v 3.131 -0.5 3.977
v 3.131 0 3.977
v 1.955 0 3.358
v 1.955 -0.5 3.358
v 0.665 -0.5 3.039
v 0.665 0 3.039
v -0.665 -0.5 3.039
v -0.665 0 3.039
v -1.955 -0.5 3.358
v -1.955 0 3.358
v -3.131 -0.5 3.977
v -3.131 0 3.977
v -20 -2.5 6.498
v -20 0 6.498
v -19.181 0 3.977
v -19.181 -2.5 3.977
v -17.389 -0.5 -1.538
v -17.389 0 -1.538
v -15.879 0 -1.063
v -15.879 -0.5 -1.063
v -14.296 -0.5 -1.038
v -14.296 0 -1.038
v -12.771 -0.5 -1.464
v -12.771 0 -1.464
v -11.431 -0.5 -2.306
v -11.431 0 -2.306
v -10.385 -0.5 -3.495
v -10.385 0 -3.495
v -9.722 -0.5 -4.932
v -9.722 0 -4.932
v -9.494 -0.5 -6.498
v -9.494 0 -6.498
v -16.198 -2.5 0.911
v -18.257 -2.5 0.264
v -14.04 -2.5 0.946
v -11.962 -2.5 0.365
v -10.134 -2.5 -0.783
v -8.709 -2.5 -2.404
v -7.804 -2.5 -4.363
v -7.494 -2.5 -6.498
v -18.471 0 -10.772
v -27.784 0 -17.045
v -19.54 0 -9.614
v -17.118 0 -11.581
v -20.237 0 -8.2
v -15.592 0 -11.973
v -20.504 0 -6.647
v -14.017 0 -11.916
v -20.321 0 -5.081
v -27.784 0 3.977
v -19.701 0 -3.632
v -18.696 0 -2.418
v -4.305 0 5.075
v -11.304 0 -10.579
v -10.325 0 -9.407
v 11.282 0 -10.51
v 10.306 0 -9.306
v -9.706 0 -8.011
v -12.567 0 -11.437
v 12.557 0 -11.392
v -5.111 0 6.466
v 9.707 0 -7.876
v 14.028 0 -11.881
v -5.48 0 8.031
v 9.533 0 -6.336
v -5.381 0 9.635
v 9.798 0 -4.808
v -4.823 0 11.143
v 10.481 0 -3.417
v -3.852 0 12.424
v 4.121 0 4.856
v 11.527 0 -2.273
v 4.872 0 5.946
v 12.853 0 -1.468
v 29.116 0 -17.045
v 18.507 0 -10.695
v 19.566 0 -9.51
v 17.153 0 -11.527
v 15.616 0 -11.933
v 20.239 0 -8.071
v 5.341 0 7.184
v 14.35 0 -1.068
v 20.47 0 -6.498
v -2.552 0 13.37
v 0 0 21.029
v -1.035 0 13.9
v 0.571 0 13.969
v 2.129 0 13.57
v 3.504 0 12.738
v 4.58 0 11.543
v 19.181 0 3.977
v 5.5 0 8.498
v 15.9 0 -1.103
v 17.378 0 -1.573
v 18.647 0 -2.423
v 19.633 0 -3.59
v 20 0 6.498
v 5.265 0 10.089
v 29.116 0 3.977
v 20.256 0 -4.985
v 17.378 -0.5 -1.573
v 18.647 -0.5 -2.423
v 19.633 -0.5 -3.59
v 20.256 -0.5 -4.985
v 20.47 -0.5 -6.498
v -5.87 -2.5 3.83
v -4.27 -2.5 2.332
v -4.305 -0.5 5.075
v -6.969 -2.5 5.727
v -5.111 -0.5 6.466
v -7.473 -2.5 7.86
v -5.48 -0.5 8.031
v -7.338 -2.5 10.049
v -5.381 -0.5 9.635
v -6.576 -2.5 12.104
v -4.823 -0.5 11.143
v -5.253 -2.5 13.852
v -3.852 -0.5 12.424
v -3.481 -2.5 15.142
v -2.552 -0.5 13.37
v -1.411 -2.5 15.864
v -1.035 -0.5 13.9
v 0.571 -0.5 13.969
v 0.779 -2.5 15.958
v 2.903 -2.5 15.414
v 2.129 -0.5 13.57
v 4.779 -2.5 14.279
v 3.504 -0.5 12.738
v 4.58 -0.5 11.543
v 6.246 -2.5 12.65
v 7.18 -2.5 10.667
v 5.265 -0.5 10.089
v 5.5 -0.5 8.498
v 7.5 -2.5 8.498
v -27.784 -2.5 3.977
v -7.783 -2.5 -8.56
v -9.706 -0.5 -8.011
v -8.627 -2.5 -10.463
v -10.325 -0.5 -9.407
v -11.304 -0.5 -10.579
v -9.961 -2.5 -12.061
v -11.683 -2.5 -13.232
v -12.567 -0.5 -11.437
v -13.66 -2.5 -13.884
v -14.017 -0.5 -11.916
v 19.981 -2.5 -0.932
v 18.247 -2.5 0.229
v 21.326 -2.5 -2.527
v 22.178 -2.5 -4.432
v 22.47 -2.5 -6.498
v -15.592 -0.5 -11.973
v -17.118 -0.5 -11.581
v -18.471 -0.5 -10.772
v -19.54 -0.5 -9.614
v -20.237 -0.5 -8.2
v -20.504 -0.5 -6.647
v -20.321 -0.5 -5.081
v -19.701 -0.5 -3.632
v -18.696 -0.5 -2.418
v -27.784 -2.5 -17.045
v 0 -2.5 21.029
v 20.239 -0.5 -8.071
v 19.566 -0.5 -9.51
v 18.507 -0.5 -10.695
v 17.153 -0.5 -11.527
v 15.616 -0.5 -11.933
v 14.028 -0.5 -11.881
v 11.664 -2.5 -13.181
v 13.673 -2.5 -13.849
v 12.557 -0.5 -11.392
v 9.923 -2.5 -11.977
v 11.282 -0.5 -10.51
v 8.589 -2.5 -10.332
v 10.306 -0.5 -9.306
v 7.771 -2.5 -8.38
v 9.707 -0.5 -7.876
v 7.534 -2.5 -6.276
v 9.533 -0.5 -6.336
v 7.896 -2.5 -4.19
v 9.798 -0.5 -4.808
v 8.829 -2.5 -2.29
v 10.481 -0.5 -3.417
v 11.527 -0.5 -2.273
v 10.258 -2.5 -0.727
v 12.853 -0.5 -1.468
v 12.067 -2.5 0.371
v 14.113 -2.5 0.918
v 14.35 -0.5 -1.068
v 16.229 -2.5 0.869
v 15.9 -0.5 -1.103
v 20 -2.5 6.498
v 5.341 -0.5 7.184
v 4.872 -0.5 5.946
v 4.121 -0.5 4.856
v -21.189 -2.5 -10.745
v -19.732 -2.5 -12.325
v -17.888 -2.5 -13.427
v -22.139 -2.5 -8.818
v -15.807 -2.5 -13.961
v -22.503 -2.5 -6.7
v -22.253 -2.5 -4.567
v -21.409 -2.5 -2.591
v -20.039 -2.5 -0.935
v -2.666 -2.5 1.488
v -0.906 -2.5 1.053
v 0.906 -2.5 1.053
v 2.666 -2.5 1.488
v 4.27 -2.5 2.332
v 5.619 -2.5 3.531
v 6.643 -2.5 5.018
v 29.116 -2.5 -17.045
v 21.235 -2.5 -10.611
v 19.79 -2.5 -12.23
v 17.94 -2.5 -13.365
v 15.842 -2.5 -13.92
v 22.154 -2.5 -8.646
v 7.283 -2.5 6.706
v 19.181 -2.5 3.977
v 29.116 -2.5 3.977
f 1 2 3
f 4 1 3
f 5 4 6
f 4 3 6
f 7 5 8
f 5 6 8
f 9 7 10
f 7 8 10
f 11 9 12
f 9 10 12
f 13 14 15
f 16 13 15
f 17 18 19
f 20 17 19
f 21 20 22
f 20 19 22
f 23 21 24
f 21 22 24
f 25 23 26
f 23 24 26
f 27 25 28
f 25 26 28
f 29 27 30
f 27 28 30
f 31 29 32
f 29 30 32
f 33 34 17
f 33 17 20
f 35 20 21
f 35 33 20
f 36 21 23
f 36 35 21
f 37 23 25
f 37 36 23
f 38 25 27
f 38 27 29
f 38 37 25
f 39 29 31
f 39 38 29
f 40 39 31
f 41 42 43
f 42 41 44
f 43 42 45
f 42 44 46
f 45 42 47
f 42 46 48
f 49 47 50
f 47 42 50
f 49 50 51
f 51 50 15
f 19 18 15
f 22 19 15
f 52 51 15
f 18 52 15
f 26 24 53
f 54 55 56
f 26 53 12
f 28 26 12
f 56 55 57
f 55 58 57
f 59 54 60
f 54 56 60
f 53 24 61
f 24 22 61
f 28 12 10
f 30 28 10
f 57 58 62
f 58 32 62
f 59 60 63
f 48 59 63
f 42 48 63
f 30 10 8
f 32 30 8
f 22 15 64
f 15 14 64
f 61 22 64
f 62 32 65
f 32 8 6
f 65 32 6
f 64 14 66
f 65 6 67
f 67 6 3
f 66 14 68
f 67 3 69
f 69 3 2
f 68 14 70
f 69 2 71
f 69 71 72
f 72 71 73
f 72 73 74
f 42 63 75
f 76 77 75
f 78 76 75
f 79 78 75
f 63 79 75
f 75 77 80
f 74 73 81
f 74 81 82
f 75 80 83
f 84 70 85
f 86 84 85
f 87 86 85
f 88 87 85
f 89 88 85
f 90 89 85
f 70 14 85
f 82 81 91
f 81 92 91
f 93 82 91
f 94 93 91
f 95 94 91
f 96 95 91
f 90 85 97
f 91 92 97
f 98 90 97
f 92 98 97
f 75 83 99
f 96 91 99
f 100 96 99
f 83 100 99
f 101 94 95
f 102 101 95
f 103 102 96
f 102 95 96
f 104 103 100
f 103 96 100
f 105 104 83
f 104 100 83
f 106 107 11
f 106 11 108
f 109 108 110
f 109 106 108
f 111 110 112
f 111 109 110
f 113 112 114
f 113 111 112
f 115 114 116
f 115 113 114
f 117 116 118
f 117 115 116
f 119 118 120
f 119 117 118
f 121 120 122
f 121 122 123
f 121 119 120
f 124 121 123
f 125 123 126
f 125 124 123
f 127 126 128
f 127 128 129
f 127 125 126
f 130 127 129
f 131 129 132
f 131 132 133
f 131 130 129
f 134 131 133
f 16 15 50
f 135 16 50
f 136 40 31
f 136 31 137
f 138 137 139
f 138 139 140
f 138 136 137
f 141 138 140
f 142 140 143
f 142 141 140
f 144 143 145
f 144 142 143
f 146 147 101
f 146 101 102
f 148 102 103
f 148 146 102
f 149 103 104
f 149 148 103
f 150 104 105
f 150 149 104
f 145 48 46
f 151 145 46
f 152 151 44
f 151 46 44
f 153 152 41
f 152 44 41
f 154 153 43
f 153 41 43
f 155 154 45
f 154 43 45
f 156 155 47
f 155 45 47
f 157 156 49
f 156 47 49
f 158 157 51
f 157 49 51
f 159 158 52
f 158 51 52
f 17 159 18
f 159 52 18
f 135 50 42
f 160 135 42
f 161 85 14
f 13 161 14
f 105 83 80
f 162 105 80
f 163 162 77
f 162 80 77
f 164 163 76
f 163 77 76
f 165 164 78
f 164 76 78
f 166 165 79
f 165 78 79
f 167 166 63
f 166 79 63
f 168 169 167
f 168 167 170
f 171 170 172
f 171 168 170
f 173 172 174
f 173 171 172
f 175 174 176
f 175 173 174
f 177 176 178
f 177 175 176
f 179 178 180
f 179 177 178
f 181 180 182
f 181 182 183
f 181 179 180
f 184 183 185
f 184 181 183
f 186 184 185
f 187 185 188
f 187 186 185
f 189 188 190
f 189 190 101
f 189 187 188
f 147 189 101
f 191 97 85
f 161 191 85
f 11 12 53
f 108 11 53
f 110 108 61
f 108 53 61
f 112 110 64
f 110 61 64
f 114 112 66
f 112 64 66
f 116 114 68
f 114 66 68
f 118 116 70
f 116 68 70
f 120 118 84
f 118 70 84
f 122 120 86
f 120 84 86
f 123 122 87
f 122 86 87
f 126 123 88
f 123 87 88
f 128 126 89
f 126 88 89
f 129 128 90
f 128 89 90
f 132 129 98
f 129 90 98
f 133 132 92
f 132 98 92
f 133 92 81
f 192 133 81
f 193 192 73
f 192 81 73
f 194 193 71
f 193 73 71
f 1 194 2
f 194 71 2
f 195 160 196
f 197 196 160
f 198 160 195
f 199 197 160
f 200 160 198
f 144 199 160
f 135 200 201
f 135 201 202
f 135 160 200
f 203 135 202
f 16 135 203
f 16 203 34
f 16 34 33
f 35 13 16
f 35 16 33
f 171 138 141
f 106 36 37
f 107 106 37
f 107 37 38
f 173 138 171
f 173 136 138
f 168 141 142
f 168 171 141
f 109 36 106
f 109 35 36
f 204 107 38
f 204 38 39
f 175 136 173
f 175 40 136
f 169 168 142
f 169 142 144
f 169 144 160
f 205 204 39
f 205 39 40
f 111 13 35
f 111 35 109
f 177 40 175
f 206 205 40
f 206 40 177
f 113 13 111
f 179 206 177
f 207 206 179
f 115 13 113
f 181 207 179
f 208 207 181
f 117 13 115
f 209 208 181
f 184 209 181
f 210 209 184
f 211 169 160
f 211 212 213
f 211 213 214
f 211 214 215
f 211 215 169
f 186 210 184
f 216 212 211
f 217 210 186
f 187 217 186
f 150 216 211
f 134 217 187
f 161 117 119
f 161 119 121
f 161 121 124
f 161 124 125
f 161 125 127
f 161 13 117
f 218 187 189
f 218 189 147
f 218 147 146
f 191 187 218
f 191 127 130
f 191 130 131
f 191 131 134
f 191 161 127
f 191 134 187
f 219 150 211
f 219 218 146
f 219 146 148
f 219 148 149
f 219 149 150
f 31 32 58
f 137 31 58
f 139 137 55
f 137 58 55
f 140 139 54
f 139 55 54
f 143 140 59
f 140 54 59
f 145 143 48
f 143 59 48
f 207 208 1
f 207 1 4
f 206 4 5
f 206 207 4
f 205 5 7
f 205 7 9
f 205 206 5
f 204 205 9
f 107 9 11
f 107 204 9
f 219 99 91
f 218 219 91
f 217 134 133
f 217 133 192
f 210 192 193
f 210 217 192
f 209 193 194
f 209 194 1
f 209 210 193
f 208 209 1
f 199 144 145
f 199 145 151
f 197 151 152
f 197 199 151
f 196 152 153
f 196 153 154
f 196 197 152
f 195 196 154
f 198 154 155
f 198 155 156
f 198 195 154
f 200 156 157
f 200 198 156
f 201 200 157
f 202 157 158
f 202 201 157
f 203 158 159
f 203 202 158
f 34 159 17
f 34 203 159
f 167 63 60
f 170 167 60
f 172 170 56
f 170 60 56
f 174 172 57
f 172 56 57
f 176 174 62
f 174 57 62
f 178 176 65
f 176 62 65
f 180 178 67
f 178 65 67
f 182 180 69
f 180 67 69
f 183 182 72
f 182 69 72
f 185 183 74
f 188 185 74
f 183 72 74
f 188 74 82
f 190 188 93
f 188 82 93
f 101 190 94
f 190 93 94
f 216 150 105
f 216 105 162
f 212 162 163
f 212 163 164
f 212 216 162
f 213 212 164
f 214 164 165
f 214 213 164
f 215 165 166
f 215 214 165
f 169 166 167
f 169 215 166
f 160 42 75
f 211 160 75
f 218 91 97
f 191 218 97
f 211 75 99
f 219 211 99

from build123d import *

# Parameters (mm, degrees)
F1_DEPTH = 2.5
F2_SIZE  = 2


with BuildPart() as f1:
    # F0 (on Front) → F1 (new body)
    with BuildSketch(Plane.XZ):
        with BuildLine():
            Line((20, 6.4983939247), (0, 21.0292444848))
            Line((0, 21.0292444848), (-20, 6.4983939247))
            Line((-20, 6.4983939247), (-19.1806086697, 3.976566717))
            Line((-19.1806086697, 3.976566717), (-3.1309868579, 3.976566717))
            ThreePointArc((-3.1309868579, 3.976566717), (-2.5524079103, 13.3702738348), (5.5, 8.4983939247))
            ThreePointArc((5.5, 8.4983939247), (4.8718799102, 5.9459860143), (3.1309868579, 3.976566717))
            Line((3.1309868579, 3.976566717), (19.1806086697, 3.976566717))
            Line((19.1806086697, 3.976566717), (20, 6.4983939247))
        make_face()
        with BuildLine():
            Line((29.1157588363, 3.976566717), (19.1806086697, 3.976566717))
            Line((19.1806086697, 3.976566717), (17.3775660969, -1.5726277263))
            ThreePointArc((17.3775660969, -1.5726277263), (19.6325054401, -3.5904932157), (20.4695514611, -6.4983939247))
            ThreePointArc((20.4695514611, -6.4983939247), (18.5071837485, -10.6954947502), (14.02819865, -11.8809207775))
            Line((14.02819865, -11.8809207775), (12.360679775, -17.013016167))
            Line((12.360679775, -17.013016167), (-12.360679775, -17.013016167))
            Line((-12.360679775, -17.013016167), (-14.0168260009, -11.9159221924))
            ThreePointArc((-14.0168260009, -11.9159221924), (-20.236535112, -8.1998473226), (-17.388938746, -1.5376263114))
            Line((-17.388938746, -1.5376263114), (-19.1806086697, 3.976566717))
            Line((-19.1806086697, 3.976566717), (-27.784332633, 3.976566717))
            Line((-27.784332633, 3.976566717), (-27.784332633, -17.0448571444))
            Line((-27.784332633, -17.0448571444), (29.1157588363, -17.0448571444))
            Line((29.1157588363, -17.0448571444), (29.1157588363, 3.976566717))
        make_face()
        with BuildLine():
            Line((17.3775660969, -1.5726277263), (19.1806086697, 3.976566717))
            Line((19.1806086697, 3.976566717), (3.1309868579, 3.976566717))
            ThreePointArc((3.1309868579, 3.976566717), (0, 2.9983939247), (-3.1309868579, 3.976566717))
            Line((-3.1309868579, 3.976566717), (-19.1806086697, 3.976566717))
            Line((-19.1806086697, 3.976566717), (-17.388938746, -1.5376263114))
            ThreePointArc((-17.388938746, -1.5376263114), (-12.0706057057, -1.8363243506), (-9.4939811438, -6.4983939247))
            ThreePointArc((-9.4939811438, -6.4983939247), (-10.7733217403, -10.0270529523), (-14.0168260009, -11.9159221924))
            Line((-14.0168260009, -11.9159221924), (-12.360679775, -17.013016167))
            Line((-12.360679775, -17.013016167), (12.360679775, -17.013016167))
            Line((12.360679775, -17.013016167), (14.02819865, -11.8809207775))
            ThreePointArc((14.02819865, -11.8809207775), (9.7981474417, -4.8082095716), (17.3775660969, -1.5726277263))
        make_face()
    extrude(amount=F1_DEPTH)

    # F2
    f2_edges = [f1.edges().sort_by_distance(p)[0] for p in [
        (-3.130987, -2.5, 13.020221),
        (12.622434, -2.5, -11.42416),
        (-20.506019, -2.5, -6.498394),
    ]]
    chamfer(f2_edges, length=F2_SIZE)


solid = f1.part
